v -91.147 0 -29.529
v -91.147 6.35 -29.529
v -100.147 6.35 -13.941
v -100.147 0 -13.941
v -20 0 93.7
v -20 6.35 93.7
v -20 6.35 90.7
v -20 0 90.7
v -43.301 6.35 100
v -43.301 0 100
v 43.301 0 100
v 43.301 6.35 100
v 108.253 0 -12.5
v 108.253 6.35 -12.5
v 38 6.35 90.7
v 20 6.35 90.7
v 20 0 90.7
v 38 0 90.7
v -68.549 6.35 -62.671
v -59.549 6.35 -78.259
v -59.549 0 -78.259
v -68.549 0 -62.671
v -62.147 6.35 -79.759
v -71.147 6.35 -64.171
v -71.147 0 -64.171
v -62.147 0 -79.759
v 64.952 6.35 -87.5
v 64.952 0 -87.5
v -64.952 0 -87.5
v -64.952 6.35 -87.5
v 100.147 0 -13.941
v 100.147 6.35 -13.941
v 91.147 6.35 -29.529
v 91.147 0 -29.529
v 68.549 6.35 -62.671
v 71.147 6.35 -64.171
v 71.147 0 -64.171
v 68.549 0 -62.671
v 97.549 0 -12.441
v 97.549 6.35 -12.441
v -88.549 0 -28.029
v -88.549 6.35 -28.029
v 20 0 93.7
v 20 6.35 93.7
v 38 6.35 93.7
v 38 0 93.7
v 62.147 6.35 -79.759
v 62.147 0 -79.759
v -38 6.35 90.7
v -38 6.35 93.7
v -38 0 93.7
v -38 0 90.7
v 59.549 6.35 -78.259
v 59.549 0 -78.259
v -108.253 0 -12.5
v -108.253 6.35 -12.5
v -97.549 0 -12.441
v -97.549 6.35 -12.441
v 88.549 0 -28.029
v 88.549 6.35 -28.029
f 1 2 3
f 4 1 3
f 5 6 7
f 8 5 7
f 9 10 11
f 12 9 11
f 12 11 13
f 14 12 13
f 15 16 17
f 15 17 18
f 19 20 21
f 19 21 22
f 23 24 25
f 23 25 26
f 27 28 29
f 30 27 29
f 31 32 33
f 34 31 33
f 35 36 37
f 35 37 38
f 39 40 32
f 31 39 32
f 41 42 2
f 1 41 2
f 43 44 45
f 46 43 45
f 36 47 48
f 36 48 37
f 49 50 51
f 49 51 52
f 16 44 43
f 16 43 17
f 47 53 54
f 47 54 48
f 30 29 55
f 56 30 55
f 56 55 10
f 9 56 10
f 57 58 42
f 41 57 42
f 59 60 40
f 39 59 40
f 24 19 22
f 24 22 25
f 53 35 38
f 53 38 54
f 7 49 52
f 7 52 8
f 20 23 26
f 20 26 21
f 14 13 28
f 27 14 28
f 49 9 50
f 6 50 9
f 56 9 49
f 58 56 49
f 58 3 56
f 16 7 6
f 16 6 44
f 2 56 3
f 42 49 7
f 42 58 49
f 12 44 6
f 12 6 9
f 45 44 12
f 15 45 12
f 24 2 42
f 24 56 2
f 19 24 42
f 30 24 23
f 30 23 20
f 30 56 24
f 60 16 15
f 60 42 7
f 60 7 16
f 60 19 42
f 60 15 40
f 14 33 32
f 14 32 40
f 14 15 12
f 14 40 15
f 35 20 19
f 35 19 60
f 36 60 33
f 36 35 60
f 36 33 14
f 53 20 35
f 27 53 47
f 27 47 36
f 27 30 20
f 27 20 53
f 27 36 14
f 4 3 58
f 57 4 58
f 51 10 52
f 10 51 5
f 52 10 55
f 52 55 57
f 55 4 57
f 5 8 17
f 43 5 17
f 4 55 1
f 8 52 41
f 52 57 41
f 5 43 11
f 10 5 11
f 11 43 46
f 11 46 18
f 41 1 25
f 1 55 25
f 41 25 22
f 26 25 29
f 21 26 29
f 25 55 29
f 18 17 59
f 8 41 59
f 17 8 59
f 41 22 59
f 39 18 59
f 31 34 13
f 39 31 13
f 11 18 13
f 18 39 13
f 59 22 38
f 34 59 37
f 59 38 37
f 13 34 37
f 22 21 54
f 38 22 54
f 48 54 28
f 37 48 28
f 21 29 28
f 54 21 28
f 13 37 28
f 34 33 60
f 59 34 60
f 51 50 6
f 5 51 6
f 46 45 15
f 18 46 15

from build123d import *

# Parameters (mm, degrees)
BOSS_EXTRUDE1_DEPTH = 6.35
SKETCH2_W           = 18
SKETCH2_H           = 3
CUT_EXTRUDE1_DEPTH  = 148.509567486


with BuildPart() as part:
    # Sketch1 → Boss-Extrude1 (new body)
    with BuildSketch(Plane(origin=(0, 0, 0), x_dir=(1, 0, 0), z_dir=(0, 1, 0))):
        Polygon((64.951905284, 87.5), (-64.951905284, 87.5), (-108.253175473, 12.5), (-43.301270189, -100), (43.301270189, -100), (108.253175473, 12.5), align=None)
    extrude(amount=BOSS_EXTRUDE1_DEPTH)

    # Sketch2 → Cut-Extrude1 (cut, through all)
    with BuildSketch(Plane(origin=(0, 6.35, 0), x_dir=(1, 0, 0), z_dir=(0, 1, 0))):
        with Locations((-29, -92.2)):
            Rectangle(SKETCH2_W, SKETCH2_H)
        with Locations((29, -92.2)):
            Rectangle(SKETCH2_W, SKETCH2_H)
        Polygon((-62.146580335, 79.758965344), (-59.548504123, 78.258965344), (-68.548504123, 62.670508076), (-71.146580335, 64.170508076), align=None)
        Polygon((-97.548504123, 12.441034656), (-88.548504123, 28.029491924), (-91.146580335, 29.529491924), (-100.146580335, 13.941034656), align=None)
        Polygon((100.146580335, 13.941034656), (91.146580335, 29.529491924), (88.548504123, 28.029491924), (97.548504123, 12.441034656), align=None)
        Polygon((59.548504123, 78.258965344), (62.146580335, 79.758965344), (71.146580335, 64.170508076), (68.548504123, 62.670508076), align=None)
    extrude(amount=-CUT_EXTRUDE1_DEPTH, mode=Mode.SUBTRACT)


solid = part.part
